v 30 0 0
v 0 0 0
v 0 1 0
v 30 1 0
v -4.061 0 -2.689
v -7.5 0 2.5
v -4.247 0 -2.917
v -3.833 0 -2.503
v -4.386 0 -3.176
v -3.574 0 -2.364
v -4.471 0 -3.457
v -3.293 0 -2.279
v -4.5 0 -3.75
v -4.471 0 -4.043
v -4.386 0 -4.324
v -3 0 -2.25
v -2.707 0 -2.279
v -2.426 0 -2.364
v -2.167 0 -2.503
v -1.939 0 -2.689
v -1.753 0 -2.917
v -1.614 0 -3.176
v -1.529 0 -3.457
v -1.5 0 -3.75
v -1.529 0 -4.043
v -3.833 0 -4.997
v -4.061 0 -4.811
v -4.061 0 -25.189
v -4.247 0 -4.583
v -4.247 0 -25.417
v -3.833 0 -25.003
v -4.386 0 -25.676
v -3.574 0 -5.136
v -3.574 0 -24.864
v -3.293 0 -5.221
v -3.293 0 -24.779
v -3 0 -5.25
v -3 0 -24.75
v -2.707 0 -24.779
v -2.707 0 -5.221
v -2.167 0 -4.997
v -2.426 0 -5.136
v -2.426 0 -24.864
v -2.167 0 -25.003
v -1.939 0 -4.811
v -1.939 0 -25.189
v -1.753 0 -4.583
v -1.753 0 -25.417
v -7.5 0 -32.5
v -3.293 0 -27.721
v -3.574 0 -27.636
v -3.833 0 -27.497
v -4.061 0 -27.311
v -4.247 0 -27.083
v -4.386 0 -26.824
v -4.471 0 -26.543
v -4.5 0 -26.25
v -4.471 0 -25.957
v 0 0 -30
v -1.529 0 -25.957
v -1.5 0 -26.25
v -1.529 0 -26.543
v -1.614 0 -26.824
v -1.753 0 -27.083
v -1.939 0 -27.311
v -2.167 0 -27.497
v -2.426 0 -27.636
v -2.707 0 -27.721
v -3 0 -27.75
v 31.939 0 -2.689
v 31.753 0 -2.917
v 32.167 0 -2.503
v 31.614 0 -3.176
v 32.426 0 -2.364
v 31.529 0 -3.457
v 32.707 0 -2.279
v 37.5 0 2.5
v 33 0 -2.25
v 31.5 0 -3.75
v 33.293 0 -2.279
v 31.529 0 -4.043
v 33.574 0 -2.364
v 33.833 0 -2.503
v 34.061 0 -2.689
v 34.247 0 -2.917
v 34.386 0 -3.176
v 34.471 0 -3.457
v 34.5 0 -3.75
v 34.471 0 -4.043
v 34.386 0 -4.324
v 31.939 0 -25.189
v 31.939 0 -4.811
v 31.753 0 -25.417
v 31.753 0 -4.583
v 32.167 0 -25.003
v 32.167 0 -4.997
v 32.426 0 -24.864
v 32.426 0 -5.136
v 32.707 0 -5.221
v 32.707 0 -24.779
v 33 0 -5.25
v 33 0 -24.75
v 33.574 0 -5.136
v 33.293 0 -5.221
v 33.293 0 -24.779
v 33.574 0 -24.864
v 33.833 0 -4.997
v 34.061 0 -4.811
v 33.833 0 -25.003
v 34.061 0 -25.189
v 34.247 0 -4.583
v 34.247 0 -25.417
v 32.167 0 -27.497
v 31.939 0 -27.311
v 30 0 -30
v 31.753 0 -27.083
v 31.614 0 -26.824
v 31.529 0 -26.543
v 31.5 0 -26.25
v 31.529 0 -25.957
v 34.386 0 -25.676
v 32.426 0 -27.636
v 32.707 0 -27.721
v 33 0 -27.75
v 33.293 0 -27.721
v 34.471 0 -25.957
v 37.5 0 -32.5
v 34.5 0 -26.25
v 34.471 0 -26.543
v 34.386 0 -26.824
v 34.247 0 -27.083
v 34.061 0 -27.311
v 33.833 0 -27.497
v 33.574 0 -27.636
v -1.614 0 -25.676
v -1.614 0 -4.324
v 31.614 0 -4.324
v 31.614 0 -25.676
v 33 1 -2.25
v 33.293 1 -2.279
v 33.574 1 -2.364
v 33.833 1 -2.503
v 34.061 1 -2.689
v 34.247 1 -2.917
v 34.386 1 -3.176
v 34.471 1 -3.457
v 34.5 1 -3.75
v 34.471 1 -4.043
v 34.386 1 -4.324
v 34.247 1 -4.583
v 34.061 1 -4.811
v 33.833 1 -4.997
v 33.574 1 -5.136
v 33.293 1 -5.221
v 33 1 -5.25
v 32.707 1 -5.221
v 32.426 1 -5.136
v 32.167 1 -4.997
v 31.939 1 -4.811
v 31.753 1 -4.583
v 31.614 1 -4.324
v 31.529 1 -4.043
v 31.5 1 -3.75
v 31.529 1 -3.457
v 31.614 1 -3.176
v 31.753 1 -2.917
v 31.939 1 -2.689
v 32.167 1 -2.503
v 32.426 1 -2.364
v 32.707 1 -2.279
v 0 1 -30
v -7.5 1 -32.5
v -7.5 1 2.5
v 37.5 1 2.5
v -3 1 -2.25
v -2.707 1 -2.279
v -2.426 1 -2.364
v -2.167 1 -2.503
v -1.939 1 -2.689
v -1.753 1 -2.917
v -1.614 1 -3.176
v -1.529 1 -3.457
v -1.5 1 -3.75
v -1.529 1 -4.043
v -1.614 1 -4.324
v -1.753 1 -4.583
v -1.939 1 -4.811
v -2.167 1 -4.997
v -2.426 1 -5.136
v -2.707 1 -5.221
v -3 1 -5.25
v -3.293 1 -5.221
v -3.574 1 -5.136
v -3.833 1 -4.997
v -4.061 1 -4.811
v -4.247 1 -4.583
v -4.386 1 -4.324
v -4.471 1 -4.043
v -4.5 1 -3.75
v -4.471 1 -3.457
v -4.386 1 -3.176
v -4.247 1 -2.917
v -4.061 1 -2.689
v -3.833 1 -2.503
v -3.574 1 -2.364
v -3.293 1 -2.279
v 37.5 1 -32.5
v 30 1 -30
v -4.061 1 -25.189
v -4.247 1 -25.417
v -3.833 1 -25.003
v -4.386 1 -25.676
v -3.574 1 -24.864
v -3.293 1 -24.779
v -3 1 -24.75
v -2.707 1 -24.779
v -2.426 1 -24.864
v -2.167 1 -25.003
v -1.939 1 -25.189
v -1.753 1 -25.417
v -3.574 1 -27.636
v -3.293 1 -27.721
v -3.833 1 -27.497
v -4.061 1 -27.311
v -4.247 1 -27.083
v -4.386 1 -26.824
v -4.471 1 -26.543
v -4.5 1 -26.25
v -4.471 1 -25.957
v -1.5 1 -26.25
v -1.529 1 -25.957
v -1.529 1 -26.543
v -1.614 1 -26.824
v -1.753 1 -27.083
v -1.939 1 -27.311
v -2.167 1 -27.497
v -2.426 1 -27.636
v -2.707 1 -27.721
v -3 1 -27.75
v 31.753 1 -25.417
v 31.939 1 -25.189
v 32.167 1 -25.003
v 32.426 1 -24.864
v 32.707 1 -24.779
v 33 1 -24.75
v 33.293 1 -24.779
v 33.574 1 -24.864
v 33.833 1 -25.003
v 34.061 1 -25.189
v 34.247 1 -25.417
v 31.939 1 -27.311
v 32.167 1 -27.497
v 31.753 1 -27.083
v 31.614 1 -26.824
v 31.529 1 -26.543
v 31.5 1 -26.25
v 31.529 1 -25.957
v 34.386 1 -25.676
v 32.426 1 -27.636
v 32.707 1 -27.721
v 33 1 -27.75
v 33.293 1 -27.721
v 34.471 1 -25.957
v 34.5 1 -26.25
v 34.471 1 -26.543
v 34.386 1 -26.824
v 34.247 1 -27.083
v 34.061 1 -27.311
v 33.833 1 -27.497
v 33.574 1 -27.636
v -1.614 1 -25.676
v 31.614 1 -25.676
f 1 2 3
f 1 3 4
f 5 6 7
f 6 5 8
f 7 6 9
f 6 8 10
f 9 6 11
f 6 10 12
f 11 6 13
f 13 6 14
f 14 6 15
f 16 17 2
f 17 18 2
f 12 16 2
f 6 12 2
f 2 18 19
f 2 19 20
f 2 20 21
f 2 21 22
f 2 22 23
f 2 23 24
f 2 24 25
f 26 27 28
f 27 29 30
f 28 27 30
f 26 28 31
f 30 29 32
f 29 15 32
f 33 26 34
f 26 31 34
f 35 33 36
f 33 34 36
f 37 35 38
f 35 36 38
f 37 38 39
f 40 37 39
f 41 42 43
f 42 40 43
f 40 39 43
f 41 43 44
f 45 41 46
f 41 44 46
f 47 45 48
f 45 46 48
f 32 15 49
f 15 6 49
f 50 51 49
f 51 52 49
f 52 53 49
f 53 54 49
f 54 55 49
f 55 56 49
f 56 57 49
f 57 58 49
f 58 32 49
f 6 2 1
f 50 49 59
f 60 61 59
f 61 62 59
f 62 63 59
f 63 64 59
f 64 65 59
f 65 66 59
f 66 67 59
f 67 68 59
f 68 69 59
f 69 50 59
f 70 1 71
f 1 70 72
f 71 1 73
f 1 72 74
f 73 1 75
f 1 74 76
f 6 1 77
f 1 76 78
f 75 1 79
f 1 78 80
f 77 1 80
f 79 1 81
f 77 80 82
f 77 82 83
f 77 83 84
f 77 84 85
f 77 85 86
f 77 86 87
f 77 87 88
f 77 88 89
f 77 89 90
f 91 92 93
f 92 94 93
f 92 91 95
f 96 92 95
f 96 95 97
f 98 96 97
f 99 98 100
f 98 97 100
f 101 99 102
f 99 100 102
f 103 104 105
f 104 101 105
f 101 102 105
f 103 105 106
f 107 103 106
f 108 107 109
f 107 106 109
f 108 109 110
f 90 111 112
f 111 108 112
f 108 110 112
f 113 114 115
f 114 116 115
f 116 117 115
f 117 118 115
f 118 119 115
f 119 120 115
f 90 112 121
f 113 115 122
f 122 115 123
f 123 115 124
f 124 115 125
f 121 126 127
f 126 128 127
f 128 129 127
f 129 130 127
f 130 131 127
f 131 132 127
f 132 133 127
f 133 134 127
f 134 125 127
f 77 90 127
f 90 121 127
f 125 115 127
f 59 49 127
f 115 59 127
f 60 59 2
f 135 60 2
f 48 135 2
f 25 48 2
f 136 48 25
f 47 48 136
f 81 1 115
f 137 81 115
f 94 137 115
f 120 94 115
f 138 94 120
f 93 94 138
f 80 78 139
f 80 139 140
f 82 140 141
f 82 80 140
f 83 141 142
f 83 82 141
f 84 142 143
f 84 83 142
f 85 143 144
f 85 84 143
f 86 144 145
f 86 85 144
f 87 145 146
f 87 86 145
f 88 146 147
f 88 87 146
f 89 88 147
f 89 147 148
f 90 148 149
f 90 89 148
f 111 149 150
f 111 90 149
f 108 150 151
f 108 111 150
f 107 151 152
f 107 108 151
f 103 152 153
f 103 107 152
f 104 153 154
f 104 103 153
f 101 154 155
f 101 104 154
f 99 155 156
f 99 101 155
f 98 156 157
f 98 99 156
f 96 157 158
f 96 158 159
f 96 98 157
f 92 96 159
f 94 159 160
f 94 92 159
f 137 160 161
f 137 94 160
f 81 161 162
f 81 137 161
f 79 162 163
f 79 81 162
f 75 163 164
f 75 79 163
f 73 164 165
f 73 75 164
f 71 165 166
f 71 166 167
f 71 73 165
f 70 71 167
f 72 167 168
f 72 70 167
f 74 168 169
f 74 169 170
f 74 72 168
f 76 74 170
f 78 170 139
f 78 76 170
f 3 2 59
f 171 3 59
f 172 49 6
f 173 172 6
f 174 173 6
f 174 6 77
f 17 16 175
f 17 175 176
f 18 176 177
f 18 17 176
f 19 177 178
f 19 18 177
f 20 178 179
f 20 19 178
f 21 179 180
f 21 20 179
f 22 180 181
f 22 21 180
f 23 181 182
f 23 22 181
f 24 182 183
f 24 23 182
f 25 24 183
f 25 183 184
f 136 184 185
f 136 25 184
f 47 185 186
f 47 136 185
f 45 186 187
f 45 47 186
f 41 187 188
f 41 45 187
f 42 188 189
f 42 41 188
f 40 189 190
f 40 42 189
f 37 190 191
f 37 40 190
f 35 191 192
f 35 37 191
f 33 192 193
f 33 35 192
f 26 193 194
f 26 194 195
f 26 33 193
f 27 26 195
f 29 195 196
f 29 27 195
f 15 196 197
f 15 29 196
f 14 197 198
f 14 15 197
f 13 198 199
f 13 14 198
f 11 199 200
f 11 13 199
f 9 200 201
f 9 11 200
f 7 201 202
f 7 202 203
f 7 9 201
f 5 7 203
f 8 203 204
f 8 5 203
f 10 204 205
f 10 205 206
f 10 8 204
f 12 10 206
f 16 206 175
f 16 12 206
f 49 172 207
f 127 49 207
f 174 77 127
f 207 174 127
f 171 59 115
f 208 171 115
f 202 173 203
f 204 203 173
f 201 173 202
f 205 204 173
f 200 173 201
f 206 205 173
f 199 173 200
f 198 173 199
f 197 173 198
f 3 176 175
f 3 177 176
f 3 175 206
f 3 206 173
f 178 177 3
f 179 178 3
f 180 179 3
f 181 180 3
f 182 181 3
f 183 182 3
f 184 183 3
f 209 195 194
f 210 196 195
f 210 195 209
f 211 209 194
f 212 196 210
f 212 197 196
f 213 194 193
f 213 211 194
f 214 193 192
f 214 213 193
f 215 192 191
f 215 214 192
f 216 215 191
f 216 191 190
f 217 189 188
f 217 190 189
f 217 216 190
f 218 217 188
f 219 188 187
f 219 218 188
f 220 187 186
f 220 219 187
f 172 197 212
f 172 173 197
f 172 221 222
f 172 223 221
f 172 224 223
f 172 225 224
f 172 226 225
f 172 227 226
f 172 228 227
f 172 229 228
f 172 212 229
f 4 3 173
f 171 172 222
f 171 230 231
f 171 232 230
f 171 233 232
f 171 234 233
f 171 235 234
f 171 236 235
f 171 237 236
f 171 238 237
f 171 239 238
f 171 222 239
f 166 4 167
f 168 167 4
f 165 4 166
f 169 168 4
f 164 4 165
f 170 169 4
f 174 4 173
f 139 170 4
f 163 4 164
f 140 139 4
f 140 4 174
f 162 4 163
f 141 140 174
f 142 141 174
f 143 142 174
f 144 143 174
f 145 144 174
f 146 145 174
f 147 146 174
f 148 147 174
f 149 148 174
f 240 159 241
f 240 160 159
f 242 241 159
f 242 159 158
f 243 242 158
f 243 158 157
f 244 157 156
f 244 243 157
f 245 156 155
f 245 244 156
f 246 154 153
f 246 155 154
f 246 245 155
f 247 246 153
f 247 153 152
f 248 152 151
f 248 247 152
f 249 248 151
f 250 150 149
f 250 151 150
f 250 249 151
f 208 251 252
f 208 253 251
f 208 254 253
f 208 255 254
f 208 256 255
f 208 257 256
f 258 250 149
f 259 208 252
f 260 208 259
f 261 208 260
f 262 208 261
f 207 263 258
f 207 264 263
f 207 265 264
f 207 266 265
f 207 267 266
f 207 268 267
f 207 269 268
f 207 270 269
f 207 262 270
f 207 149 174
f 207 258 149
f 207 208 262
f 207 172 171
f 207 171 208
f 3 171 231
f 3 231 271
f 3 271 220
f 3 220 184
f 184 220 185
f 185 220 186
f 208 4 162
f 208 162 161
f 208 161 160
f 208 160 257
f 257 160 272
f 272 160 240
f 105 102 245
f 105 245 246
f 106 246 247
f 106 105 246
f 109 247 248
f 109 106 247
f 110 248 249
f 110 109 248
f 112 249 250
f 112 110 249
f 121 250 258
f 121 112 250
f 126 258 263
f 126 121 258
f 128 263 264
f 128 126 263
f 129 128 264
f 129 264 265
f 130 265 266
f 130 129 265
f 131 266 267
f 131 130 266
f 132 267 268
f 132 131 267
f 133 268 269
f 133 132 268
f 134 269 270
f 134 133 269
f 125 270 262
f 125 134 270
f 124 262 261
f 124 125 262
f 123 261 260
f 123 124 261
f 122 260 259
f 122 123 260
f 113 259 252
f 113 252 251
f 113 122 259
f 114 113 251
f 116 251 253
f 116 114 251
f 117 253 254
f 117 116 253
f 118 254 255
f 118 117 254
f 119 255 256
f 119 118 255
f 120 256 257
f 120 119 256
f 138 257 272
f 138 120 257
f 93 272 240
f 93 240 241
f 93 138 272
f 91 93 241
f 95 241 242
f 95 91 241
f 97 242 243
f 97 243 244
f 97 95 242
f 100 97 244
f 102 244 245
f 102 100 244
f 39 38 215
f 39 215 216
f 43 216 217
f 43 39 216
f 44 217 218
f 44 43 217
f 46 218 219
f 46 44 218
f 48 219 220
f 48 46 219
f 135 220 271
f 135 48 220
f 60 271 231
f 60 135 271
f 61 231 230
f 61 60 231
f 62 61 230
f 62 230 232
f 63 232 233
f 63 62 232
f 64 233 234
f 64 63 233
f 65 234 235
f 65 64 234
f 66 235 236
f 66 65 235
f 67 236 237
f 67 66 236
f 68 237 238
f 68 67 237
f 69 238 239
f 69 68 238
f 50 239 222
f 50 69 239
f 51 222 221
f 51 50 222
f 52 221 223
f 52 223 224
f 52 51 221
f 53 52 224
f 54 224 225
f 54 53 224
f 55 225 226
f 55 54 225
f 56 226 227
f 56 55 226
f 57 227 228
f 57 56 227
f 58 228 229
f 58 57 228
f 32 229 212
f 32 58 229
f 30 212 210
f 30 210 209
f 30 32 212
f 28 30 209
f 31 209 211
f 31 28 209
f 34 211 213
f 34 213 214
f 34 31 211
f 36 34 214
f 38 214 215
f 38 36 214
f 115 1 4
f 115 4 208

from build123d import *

# Parameters (mm, degrees)
CROQUIS1_R              = 1.5
CROQUIS1_W              = 30
CROQUIS1_H              = 30
SALIENTE_EXTRUIR1_DEPTH = 1
CROQUIS2_W              = 45
CROQUIS2_H              = 5
CORTAR_EXTRUIR1_DEPTH   = 10


with BuildPart() as part:
    # Croquis1 → Saliente-Extruir1 (new body)
    with BuildSketch(Plane(origin=(0, 0, 0), x_dir=(1, 0, 0), z_dir=(0, 1, 0))):
        with BuildLine():
            ThreePointArc((-7.5, -7.398453182), (-7.449747468, -7.449747468), (-7.398453182, -7.5))
            Line((-7.398453182, -7.5), (37.5, -7.5))
            Line((37.5, -7.5), (37.5, 37.5))
            Line((37.5, 37.5), (-7.5, 37.5))
            Line((-7.5, 37.5), (-7.5, -7.398453182))
        make_face()
        with Locations(Location((-3, 3.75, 0), (0, 0, 270))):
            Circle(CROQUIS1_R, mode=Mode.SUBTRACT)
        with Locations(Location((33, 3.75, 0), (0, 0, 270))):
            Circle(CROQUIS1_R, mode=Mode.SUBTRACT)
        with Locations(Location((-3, 26.25, 0), (0, 0, 270))):
            Circle(CROQUIS1_R, mode=Mode.SUBTRACT)
        with Locations((15, 15)):
            Rectangle(CROQUIS1_W, CROQUIS1_H, mode=Mode.SUBTRACT)
        with Locations(Location((33, 26.25, 0), (0, 0, 270))):
            Circle(CROQUIS1_R, mode=Mode.SUBTRACT)
    extrude(amount=SALIENTE_EXTRUIR1_DEPTH)

    # Croquis2 → Cortar-Extruir1 (cut)
    with BuildSketch(Plane(origin=(0, 1, 0), x_dir=(1, 0, 0), z_dir=(0, 1, 0))):
        with Locations((15, 35)):
            Rectangle(CROQUIS2_W, CROQUIS2_H)
        with Locations((15, -5)):
            Rectangle(CROQUIS2_W, CROQUIS2_H)
    extrude(amount=-CORTAR_EXTRUIR1_DEPTH, mode=Mode.SUBTRACT)


solid = part.part
